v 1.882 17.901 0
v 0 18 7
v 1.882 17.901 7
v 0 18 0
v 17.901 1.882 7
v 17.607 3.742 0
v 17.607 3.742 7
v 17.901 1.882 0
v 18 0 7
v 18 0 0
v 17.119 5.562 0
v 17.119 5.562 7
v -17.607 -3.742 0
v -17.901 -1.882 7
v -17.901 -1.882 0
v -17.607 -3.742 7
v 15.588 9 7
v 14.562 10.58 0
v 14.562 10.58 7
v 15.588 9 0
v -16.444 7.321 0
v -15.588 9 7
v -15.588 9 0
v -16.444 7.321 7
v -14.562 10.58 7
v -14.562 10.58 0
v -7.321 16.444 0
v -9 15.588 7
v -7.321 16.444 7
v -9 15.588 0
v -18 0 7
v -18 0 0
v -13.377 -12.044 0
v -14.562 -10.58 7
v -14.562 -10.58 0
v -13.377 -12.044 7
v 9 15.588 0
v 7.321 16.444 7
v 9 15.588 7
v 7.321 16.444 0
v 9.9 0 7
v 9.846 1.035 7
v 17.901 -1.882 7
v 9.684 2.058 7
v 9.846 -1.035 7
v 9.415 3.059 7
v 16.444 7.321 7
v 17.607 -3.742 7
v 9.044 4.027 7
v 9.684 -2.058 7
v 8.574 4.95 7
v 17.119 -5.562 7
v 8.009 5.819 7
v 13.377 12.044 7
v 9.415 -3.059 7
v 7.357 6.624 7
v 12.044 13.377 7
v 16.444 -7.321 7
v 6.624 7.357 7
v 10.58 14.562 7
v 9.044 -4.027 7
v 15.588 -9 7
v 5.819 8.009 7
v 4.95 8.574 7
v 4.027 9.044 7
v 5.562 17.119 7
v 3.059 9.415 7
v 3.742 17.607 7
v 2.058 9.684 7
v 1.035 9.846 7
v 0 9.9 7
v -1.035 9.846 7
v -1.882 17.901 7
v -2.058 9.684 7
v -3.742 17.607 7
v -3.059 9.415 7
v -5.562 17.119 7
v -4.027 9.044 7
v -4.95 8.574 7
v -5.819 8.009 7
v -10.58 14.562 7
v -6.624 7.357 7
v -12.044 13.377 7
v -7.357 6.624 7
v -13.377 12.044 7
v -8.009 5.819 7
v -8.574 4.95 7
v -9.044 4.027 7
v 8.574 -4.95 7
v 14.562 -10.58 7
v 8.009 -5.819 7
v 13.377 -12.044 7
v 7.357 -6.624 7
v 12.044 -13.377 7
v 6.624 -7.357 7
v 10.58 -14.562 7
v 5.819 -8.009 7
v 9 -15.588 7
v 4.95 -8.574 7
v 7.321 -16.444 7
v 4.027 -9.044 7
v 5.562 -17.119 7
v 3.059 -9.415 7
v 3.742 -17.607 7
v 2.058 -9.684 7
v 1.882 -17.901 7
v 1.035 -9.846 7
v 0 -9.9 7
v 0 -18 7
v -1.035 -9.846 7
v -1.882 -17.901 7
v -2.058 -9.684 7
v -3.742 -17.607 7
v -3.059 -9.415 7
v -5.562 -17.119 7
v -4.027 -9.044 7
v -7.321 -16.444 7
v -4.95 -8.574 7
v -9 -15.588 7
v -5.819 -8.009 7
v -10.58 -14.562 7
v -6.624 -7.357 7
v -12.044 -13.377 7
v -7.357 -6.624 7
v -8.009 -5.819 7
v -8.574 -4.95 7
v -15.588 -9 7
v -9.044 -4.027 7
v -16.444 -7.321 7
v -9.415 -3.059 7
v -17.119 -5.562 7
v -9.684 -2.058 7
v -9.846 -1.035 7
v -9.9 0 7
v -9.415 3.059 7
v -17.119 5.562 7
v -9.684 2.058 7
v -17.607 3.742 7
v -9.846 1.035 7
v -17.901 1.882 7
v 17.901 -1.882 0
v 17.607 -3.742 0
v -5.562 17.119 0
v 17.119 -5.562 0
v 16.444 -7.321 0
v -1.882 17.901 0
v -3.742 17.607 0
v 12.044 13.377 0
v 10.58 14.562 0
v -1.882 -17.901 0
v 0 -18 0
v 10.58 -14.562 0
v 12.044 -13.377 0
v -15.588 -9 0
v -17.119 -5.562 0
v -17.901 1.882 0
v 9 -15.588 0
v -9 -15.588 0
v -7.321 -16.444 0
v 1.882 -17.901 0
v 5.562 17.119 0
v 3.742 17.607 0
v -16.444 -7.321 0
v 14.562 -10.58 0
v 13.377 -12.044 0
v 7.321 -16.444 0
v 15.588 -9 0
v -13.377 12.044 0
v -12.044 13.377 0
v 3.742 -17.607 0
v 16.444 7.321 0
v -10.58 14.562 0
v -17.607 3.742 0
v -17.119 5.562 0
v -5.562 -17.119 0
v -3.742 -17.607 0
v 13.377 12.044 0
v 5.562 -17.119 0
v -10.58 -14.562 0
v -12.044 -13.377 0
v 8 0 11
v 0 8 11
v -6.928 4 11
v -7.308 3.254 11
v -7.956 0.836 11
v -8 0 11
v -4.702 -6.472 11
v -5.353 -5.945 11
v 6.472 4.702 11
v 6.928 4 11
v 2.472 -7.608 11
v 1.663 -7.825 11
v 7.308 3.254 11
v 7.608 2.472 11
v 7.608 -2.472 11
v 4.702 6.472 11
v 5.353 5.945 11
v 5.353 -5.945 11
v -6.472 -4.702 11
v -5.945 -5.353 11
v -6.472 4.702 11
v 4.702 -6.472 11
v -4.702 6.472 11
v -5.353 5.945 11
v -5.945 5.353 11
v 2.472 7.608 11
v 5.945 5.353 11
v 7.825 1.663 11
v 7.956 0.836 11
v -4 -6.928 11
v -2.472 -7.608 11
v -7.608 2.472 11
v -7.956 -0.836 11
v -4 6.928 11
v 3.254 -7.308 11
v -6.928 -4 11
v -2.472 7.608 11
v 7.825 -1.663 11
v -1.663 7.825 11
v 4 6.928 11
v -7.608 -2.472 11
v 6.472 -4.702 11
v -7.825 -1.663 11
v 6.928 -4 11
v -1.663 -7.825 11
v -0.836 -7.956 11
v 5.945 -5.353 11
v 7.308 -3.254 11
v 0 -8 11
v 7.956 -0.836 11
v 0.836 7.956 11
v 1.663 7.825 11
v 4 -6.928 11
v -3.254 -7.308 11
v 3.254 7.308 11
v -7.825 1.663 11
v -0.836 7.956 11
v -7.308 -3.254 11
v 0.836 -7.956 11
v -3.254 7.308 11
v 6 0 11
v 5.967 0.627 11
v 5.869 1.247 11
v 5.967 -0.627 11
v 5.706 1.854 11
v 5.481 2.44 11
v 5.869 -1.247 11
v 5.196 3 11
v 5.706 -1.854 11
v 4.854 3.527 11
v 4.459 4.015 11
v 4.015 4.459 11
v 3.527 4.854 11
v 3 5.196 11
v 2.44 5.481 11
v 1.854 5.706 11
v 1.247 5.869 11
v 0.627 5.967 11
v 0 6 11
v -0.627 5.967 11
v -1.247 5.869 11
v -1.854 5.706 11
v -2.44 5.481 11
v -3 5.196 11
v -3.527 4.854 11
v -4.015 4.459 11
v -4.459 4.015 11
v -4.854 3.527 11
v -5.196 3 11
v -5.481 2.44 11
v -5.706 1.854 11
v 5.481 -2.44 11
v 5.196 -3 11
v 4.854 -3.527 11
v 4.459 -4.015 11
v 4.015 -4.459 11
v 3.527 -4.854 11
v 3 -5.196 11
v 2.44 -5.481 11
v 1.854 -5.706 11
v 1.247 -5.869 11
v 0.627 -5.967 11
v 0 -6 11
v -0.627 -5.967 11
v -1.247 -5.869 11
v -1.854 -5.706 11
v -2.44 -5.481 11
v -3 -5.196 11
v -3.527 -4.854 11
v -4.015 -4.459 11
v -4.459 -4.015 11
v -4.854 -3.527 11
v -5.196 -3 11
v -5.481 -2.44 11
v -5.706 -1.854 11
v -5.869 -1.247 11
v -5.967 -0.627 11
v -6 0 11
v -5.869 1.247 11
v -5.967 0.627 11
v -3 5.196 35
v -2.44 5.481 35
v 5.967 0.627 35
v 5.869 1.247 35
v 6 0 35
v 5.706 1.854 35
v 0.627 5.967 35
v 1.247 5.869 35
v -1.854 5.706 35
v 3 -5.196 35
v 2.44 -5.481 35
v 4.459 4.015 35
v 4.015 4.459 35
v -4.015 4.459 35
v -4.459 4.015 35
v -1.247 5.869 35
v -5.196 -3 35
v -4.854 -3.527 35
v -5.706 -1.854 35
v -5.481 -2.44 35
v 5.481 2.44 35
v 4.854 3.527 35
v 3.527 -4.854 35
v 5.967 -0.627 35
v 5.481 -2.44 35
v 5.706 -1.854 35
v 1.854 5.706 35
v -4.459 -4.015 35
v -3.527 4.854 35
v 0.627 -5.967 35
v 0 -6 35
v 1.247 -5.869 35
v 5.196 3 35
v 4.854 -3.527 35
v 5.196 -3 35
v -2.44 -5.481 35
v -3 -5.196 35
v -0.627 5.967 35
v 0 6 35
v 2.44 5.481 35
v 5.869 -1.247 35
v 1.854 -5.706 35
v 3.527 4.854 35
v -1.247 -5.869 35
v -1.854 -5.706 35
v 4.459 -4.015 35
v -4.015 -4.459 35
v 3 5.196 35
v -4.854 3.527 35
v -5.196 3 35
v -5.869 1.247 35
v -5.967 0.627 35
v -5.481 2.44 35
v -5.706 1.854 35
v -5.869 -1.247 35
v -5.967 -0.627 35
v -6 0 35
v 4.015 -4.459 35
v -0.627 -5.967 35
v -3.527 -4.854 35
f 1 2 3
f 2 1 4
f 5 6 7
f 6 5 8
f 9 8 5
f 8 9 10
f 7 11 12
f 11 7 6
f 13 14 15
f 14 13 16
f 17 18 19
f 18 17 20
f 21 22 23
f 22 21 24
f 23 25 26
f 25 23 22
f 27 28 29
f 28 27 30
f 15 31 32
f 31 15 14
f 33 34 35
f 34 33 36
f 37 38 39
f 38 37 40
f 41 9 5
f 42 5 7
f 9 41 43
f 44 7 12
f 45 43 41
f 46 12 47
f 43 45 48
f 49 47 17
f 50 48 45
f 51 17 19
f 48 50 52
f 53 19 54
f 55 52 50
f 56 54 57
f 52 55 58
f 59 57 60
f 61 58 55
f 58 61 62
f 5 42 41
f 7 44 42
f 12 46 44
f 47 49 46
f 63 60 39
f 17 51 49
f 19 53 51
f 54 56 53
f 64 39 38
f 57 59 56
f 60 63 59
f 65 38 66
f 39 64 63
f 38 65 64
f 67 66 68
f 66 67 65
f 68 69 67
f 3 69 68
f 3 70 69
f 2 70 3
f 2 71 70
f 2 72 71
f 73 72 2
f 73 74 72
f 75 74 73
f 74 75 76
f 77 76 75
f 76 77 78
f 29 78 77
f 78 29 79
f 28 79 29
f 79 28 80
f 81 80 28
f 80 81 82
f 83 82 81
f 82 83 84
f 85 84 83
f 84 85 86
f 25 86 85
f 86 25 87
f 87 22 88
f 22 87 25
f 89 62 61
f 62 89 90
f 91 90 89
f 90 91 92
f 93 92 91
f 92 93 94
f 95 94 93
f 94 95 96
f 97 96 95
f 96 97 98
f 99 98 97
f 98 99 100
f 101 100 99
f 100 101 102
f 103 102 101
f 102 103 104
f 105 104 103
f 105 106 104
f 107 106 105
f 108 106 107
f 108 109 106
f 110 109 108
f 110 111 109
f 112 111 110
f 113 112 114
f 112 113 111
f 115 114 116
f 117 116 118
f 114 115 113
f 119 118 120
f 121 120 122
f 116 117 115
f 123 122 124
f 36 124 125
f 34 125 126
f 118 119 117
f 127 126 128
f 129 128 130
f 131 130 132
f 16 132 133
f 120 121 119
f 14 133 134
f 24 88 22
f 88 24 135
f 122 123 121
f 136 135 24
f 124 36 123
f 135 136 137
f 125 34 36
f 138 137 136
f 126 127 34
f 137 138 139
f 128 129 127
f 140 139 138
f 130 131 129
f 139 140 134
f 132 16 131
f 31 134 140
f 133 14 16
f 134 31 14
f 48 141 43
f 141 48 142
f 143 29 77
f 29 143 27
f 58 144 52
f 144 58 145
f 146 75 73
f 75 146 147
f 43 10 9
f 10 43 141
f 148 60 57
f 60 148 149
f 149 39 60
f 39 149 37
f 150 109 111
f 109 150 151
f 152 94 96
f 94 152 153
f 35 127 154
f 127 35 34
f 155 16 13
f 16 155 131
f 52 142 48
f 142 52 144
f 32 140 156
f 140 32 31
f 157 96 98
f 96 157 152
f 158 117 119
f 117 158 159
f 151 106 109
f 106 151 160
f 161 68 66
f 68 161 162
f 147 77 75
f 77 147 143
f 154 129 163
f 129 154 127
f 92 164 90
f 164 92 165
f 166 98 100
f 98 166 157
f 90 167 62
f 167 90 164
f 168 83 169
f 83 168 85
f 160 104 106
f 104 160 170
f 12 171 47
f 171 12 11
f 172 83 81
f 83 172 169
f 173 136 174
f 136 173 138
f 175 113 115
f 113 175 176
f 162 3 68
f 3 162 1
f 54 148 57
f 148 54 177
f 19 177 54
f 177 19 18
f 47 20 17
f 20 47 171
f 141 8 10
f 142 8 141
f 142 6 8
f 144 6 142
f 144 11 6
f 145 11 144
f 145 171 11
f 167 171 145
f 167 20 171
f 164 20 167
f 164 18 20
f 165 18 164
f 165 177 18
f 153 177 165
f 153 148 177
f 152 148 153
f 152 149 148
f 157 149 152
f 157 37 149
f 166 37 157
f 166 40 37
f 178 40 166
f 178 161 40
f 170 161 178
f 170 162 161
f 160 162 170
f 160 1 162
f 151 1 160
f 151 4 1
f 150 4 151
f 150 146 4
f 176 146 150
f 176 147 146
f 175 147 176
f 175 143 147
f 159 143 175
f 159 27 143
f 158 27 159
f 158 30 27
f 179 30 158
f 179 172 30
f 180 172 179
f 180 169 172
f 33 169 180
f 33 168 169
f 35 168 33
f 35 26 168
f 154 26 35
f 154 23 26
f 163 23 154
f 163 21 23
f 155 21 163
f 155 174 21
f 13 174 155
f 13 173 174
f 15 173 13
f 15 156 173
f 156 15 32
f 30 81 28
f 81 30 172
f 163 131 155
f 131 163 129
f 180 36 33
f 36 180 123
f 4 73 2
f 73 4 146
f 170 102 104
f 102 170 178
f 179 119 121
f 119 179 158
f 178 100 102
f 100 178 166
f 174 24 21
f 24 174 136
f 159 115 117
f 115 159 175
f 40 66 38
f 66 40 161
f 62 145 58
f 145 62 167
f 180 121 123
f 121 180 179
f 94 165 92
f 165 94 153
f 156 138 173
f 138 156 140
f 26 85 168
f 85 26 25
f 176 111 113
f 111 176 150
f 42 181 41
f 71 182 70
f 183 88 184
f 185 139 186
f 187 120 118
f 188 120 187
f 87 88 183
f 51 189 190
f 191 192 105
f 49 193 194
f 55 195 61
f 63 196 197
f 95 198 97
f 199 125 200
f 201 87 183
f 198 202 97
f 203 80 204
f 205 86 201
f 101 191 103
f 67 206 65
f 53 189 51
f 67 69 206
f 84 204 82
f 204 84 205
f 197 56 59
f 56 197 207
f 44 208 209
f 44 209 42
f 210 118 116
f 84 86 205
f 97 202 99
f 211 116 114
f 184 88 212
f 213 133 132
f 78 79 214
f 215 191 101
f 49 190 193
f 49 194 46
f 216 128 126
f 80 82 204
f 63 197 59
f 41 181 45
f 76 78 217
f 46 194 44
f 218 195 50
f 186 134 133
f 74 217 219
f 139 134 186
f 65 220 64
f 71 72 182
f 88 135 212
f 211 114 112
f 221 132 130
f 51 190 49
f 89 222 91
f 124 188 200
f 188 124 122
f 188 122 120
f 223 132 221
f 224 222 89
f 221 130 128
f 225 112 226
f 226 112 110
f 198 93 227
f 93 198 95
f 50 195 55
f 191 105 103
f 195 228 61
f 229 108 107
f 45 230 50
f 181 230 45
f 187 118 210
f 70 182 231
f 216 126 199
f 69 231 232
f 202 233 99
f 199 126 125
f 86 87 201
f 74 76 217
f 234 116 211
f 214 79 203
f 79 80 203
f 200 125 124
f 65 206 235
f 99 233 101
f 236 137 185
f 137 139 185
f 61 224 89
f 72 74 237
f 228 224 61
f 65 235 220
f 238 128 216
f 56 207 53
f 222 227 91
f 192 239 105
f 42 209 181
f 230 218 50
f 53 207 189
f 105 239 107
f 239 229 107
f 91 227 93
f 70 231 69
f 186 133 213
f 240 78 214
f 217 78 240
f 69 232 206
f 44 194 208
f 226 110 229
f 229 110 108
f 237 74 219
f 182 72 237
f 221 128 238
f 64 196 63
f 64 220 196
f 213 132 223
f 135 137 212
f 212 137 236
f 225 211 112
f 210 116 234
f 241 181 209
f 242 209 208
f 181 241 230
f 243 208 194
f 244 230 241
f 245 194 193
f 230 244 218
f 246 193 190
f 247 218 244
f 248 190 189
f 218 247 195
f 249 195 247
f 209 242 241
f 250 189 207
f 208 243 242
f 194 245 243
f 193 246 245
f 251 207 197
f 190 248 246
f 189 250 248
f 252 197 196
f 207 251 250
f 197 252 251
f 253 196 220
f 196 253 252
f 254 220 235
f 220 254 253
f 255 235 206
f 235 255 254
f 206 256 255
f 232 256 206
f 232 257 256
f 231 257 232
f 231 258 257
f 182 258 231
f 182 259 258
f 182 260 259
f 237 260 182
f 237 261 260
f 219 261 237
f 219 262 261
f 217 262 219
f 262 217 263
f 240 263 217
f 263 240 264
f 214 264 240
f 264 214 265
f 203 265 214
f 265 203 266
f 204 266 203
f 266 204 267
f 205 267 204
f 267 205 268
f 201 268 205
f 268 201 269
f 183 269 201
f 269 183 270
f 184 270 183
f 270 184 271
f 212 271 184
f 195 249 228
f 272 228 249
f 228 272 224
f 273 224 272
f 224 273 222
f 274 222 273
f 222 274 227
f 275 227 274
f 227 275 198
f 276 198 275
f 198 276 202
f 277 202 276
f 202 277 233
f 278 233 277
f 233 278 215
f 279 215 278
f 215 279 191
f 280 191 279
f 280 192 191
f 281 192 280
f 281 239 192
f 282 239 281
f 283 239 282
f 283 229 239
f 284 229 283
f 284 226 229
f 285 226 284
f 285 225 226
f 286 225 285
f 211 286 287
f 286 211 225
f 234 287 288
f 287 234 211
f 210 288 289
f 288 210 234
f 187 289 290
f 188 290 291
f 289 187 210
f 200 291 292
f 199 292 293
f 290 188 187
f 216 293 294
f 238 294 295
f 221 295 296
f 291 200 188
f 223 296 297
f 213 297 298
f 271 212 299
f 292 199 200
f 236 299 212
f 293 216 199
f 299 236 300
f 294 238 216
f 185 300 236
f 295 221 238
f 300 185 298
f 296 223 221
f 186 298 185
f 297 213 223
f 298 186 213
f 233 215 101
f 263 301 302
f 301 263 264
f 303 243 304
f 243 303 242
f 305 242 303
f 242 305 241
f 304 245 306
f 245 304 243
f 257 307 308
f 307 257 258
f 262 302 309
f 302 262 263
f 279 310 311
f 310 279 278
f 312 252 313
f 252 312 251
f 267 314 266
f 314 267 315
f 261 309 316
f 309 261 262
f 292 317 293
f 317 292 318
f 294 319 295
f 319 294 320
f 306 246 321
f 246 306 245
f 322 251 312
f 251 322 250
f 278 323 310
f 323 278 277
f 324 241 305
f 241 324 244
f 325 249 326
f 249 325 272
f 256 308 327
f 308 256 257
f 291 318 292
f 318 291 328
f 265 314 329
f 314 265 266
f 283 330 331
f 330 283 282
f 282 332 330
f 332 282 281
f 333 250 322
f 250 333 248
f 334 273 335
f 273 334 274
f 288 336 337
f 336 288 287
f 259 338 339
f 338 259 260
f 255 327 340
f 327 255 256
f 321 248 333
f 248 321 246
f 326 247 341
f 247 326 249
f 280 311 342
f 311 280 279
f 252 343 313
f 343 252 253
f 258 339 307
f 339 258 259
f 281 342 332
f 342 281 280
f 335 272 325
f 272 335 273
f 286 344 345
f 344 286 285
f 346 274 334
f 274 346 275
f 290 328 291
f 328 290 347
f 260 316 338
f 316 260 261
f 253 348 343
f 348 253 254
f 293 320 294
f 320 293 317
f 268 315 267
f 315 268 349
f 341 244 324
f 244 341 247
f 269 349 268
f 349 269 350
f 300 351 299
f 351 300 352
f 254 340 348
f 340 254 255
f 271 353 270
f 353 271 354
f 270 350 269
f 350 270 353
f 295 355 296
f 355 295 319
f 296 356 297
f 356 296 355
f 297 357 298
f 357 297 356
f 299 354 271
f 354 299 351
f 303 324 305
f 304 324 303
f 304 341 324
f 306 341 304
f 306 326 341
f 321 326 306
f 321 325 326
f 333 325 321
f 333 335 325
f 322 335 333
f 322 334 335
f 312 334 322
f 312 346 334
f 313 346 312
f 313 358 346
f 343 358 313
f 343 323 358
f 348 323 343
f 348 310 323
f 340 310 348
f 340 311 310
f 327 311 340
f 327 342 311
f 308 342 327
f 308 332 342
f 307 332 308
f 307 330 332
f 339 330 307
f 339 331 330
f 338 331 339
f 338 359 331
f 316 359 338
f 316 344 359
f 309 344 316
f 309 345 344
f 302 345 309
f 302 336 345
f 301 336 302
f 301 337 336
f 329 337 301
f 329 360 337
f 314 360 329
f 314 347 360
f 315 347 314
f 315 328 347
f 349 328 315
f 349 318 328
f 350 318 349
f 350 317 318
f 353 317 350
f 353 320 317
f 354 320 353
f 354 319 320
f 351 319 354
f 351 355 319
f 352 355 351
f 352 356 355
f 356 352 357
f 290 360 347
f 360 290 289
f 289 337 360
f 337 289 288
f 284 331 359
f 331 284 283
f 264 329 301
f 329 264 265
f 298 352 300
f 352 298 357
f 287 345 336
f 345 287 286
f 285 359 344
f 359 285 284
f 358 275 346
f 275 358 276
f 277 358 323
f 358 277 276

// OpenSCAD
// Adjustable leveling foot, smooth threaded-shaft representation.
$fn = 60;
eps = 0.02;
shaft_d = 12;
pad_d = 36;
shaft_l = 24;
pad_h = 7;
union() {
    cylinder(d = pad_d, h = pad_h);
    translate([0, 0, pad_h]) cylinder(d1 = pad_d * 0.55, d2 = shaft_d + 4, h = 4);
    translate([0, 0, pad_h + 4]) cylinder(d = shaft_d, h = shaft_l);
}
